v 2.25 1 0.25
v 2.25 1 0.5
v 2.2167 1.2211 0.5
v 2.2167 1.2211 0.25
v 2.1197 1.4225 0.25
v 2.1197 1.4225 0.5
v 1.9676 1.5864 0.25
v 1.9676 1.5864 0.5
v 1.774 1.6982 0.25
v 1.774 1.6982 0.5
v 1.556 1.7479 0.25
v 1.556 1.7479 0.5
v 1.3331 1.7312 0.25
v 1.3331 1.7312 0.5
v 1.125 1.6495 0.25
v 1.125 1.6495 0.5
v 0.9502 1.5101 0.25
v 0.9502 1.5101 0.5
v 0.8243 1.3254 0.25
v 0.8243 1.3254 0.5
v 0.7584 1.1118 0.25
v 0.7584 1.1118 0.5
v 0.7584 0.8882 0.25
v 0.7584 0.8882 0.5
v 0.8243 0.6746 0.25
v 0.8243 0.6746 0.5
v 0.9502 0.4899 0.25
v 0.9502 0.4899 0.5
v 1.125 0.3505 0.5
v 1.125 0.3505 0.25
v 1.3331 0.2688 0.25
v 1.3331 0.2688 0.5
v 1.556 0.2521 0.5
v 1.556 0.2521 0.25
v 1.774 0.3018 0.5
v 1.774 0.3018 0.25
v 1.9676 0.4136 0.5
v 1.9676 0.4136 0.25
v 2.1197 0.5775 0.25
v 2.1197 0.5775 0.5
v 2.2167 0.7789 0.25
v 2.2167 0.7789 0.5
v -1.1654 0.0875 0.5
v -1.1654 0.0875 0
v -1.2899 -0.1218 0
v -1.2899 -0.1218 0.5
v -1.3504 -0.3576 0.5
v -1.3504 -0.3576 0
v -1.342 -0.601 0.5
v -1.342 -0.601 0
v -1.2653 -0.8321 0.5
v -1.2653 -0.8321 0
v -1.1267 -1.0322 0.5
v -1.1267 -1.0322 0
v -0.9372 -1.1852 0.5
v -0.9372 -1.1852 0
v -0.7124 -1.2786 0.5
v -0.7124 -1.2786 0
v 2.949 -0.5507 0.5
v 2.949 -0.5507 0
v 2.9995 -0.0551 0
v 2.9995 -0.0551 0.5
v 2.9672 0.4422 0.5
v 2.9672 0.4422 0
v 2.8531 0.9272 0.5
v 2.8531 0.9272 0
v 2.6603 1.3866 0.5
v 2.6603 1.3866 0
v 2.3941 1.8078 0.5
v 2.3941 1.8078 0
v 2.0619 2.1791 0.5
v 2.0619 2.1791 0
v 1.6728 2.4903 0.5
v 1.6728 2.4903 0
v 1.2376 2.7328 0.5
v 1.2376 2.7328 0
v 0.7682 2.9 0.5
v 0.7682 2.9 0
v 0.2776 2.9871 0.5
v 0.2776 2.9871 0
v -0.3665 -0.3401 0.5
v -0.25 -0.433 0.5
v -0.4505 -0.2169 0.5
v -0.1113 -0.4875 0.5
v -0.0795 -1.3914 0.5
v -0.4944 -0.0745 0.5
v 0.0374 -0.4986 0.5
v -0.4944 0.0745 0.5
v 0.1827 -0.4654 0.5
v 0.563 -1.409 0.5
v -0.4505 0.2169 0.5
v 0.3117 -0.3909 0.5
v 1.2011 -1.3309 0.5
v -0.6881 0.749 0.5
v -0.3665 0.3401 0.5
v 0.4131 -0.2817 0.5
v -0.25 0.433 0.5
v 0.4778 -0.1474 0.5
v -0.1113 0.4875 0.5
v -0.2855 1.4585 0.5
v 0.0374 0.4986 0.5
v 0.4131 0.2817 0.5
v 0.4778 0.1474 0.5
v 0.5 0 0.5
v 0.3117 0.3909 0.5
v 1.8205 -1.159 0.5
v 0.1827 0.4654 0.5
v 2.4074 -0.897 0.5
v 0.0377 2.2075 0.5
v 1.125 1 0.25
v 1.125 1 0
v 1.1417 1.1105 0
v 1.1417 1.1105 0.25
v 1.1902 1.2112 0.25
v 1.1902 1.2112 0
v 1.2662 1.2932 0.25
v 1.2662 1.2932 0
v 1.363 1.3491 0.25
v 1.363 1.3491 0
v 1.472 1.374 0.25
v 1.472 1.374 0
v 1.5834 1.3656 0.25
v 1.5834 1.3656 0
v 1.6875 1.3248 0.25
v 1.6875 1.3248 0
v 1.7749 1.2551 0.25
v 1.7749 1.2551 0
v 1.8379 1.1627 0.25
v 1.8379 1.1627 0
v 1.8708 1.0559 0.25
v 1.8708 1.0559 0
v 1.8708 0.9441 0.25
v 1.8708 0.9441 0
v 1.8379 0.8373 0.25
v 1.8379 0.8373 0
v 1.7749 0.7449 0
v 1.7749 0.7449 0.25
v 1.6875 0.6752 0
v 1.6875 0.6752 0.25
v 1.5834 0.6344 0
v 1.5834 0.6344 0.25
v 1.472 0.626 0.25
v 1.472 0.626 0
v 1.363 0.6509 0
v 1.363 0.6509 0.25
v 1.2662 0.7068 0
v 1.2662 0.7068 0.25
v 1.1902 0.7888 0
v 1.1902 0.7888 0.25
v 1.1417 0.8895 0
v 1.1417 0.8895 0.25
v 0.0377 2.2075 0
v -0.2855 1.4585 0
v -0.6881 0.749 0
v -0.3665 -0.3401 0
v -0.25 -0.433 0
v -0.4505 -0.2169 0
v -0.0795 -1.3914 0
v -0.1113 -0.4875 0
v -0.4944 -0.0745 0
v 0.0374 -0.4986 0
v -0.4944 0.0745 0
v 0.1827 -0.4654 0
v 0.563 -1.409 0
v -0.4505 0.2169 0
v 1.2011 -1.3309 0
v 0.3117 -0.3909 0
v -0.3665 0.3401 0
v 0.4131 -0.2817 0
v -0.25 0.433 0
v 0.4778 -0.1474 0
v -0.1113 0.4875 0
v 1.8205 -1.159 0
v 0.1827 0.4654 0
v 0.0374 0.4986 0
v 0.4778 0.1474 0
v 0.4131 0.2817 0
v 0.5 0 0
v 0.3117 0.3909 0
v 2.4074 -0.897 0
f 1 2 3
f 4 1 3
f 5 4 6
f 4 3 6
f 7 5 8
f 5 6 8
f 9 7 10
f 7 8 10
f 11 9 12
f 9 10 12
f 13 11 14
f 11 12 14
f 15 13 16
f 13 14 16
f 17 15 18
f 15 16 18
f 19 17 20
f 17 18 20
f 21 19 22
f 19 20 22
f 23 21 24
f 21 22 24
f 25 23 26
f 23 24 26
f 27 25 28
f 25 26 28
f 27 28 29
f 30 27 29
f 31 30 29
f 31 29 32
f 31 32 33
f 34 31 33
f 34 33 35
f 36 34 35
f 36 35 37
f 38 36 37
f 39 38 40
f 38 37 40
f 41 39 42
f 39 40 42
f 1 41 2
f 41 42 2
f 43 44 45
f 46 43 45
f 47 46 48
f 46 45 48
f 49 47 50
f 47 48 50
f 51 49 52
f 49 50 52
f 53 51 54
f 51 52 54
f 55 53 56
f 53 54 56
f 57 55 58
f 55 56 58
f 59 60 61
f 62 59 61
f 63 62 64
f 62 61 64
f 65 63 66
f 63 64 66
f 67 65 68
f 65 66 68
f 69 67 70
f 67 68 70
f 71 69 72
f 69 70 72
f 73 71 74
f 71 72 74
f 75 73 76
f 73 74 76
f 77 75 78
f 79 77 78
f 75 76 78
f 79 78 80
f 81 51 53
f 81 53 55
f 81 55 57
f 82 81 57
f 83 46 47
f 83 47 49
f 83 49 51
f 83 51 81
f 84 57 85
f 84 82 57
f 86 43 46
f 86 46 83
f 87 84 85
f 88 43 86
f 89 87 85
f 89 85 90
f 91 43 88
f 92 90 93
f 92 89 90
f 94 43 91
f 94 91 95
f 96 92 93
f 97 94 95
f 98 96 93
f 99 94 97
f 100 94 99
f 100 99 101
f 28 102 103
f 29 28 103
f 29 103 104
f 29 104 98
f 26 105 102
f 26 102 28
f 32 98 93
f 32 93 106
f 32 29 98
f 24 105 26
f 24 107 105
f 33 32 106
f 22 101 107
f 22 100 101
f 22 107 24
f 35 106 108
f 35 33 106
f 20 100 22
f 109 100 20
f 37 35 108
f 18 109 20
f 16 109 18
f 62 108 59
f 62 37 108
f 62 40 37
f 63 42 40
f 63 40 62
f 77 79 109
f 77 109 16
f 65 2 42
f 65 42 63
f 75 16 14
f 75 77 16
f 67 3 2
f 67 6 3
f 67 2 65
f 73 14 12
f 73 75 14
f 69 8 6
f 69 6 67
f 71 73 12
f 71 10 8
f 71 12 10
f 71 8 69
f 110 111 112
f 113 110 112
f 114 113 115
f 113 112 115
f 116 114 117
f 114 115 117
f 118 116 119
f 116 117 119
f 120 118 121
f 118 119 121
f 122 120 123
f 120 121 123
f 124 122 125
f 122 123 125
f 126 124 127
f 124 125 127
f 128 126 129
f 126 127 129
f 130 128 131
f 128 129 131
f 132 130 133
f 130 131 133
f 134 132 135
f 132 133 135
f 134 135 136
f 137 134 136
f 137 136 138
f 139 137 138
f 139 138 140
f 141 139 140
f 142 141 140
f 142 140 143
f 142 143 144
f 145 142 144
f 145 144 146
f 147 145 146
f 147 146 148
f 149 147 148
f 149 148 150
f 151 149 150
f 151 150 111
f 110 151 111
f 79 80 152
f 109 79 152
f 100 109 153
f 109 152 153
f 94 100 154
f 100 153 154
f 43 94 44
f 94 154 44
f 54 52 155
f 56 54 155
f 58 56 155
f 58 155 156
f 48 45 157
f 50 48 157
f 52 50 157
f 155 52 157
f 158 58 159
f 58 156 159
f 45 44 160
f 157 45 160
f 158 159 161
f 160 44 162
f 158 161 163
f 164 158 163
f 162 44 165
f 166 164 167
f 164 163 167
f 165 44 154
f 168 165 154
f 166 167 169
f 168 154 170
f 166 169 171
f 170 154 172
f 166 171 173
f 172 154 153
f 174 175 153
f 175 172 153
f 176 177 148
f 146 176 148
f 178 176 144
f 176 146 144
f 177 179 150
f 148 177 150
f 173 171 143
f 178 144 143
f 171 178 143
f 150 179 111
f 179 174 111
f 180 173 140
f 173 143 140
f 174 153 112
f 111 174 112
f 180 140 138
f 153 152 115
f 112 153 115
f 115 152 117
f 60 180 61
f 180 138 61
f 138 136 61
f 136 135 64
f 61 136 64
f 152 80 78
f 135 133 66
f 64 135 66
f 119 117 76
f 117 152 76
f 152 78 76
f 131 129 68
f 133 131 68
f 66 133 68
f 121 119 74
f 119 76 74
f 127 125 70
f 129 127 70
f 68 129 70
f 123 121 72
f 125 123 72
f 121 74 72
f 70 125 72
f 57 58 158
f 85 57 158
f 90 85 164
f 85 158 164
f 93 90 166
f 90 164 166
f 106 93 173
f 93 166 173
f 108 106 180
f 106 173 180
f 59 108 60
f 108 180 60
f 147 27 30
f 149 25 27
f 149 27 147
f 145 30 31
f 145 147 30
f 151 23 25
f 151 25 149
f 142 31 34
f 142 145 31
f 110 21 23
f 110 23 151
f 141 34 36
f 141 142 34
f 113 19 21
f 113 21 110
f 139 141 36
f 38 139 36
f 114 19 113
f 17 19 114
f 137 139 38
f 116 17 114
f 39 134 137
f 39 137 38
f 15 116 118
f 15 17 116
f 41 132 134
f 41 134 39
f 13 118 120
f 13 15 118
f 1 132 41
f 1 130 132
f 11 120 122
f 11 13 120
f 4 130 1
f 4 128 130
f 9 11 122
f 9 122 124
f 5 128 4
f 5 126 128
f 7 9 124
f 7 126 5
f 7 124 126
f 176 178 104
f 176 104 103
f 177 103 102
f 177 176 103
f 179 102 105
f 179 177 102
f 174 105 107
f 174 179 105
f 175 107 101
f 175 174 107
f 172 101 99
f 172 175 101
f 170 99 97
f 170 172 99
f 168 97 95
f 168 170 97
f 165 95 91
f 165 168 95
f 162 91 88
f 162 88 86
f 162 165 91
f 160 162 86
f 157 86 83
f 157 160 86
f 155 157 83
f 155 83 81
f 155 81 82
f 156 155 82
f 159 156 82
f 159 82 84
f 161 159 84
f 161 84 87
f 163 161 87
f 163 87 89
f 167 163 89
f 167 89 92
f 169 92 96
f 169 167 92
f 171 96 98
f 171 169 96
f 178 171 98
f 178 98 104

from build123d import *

# Parameters (mm, degrees)
CROQUIS1_R                 = 0.5
SALIENTE_EXTRUIR1_DEPTH    = 0.5
CROQUIS2_R                 = 0.75
CORTAR_EXTRUIR1_DEPTH      = 0.25
TALADRO_ROSCADO_M1X0_251_D = 0.75


with BuildPart() as part:
    # Croquis1 → Saliente-Extruir1 (new body)
    with BuildSketch(Plane.XY):
        with BuildLine():
            ThreePointArc((2.949014501, -0.550739024), (2.394136779, 1.807791217), (0.277602425, 2.987128537))
            ThreePointArc((0.277602425, 2.987128537), (-0.285523417, 1.458472772), (-1.165441148, 0.087471697))
            ThreePointArc((-1.165441148, 0.087471697), (-1.311898812, -0.719273217), (-0.712369976, -1.278605298))
            ThreePointArc((-0.712369976, -1.278605298), (1.201069025, -1.330913059), (2.949014501, -0.550739024))
        make_face()
        Circle(CROQUIS1_R, mode=Mode.SUBTRACT)
    extrude(amount=SALIENTE_EXTRUIR1_DEPTH)

    # Croquis2 → Cortar-Extruir1 (cut)
    with BuildSketch(Plane.XY.offset(0.5)):
        with Locations((1.5, 1)):
            Circle(CROQUIS2_R)
    extrude(amount=-CORTAR_EXTRUIR1_DEPTH, mode=Mode.SUBTRACT)

    # Taladro roscado M1x0.251 (through all)
    with Locations(Plane.XY.offset(0.25)):
        with Locations((1.5, 1)):
            Hole(TALADRO_ROSCADO_M1X0_251_D / 2)


solid = part.part
